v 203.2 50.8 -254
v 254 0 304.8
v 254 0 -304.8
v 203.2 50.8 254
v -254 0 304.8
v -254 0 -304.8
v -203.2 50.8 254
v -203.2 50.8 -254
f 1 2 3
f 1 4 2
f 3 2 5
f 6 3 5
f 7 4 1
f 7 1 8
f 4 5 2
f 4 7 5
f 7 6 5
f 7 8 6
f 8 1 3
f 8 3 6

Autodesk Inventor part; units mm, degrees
ref_plane "YZ Plane" through (0, 0, 0) normal (1, 0, 0) x (0, 1, 0)
ref_plane "XZ Plane" through (0, 0, 0) normal (0, 1, 0) x (-1, 0, 0)
ref_plane "XY Plane" through (0, 0, 0) normal (0, 0, 1) x (1, 0, 0)
sketch "Sketch1" plane through (0, 0, 0) normal (0, 1, 0) x (-1, 0, 0)
  line L0 (-254, 304.8) -> (254, 304.8)
  line L1 (254, 304.8) -> (254, -304.8)
  line L2 (254, -304.8) -> (-254, -304.8)
  line L3 (-254, -304.8) -> (-254, 304.8)
  line L4 (-254, 304.8) -> (254, -304.8) construction
  line L5 (254, 304.8) -> (-254, -304.8) construction
  point P0 (0, 0)
  dimension "d0" = 609.6
  dimension "d1" = 508
extrude "Extrusion1" add sketch "Sketch1" along normal blind 50.8
chamfer "Chamfer1" distance 50.8 angle 45 4 edges at (254, 50.8, 0) (0, 50.8, -304.8) (-254, 50.8, 0) (0, 50.8, 304.8)
properties part number "hologram display base (for assembly)"
